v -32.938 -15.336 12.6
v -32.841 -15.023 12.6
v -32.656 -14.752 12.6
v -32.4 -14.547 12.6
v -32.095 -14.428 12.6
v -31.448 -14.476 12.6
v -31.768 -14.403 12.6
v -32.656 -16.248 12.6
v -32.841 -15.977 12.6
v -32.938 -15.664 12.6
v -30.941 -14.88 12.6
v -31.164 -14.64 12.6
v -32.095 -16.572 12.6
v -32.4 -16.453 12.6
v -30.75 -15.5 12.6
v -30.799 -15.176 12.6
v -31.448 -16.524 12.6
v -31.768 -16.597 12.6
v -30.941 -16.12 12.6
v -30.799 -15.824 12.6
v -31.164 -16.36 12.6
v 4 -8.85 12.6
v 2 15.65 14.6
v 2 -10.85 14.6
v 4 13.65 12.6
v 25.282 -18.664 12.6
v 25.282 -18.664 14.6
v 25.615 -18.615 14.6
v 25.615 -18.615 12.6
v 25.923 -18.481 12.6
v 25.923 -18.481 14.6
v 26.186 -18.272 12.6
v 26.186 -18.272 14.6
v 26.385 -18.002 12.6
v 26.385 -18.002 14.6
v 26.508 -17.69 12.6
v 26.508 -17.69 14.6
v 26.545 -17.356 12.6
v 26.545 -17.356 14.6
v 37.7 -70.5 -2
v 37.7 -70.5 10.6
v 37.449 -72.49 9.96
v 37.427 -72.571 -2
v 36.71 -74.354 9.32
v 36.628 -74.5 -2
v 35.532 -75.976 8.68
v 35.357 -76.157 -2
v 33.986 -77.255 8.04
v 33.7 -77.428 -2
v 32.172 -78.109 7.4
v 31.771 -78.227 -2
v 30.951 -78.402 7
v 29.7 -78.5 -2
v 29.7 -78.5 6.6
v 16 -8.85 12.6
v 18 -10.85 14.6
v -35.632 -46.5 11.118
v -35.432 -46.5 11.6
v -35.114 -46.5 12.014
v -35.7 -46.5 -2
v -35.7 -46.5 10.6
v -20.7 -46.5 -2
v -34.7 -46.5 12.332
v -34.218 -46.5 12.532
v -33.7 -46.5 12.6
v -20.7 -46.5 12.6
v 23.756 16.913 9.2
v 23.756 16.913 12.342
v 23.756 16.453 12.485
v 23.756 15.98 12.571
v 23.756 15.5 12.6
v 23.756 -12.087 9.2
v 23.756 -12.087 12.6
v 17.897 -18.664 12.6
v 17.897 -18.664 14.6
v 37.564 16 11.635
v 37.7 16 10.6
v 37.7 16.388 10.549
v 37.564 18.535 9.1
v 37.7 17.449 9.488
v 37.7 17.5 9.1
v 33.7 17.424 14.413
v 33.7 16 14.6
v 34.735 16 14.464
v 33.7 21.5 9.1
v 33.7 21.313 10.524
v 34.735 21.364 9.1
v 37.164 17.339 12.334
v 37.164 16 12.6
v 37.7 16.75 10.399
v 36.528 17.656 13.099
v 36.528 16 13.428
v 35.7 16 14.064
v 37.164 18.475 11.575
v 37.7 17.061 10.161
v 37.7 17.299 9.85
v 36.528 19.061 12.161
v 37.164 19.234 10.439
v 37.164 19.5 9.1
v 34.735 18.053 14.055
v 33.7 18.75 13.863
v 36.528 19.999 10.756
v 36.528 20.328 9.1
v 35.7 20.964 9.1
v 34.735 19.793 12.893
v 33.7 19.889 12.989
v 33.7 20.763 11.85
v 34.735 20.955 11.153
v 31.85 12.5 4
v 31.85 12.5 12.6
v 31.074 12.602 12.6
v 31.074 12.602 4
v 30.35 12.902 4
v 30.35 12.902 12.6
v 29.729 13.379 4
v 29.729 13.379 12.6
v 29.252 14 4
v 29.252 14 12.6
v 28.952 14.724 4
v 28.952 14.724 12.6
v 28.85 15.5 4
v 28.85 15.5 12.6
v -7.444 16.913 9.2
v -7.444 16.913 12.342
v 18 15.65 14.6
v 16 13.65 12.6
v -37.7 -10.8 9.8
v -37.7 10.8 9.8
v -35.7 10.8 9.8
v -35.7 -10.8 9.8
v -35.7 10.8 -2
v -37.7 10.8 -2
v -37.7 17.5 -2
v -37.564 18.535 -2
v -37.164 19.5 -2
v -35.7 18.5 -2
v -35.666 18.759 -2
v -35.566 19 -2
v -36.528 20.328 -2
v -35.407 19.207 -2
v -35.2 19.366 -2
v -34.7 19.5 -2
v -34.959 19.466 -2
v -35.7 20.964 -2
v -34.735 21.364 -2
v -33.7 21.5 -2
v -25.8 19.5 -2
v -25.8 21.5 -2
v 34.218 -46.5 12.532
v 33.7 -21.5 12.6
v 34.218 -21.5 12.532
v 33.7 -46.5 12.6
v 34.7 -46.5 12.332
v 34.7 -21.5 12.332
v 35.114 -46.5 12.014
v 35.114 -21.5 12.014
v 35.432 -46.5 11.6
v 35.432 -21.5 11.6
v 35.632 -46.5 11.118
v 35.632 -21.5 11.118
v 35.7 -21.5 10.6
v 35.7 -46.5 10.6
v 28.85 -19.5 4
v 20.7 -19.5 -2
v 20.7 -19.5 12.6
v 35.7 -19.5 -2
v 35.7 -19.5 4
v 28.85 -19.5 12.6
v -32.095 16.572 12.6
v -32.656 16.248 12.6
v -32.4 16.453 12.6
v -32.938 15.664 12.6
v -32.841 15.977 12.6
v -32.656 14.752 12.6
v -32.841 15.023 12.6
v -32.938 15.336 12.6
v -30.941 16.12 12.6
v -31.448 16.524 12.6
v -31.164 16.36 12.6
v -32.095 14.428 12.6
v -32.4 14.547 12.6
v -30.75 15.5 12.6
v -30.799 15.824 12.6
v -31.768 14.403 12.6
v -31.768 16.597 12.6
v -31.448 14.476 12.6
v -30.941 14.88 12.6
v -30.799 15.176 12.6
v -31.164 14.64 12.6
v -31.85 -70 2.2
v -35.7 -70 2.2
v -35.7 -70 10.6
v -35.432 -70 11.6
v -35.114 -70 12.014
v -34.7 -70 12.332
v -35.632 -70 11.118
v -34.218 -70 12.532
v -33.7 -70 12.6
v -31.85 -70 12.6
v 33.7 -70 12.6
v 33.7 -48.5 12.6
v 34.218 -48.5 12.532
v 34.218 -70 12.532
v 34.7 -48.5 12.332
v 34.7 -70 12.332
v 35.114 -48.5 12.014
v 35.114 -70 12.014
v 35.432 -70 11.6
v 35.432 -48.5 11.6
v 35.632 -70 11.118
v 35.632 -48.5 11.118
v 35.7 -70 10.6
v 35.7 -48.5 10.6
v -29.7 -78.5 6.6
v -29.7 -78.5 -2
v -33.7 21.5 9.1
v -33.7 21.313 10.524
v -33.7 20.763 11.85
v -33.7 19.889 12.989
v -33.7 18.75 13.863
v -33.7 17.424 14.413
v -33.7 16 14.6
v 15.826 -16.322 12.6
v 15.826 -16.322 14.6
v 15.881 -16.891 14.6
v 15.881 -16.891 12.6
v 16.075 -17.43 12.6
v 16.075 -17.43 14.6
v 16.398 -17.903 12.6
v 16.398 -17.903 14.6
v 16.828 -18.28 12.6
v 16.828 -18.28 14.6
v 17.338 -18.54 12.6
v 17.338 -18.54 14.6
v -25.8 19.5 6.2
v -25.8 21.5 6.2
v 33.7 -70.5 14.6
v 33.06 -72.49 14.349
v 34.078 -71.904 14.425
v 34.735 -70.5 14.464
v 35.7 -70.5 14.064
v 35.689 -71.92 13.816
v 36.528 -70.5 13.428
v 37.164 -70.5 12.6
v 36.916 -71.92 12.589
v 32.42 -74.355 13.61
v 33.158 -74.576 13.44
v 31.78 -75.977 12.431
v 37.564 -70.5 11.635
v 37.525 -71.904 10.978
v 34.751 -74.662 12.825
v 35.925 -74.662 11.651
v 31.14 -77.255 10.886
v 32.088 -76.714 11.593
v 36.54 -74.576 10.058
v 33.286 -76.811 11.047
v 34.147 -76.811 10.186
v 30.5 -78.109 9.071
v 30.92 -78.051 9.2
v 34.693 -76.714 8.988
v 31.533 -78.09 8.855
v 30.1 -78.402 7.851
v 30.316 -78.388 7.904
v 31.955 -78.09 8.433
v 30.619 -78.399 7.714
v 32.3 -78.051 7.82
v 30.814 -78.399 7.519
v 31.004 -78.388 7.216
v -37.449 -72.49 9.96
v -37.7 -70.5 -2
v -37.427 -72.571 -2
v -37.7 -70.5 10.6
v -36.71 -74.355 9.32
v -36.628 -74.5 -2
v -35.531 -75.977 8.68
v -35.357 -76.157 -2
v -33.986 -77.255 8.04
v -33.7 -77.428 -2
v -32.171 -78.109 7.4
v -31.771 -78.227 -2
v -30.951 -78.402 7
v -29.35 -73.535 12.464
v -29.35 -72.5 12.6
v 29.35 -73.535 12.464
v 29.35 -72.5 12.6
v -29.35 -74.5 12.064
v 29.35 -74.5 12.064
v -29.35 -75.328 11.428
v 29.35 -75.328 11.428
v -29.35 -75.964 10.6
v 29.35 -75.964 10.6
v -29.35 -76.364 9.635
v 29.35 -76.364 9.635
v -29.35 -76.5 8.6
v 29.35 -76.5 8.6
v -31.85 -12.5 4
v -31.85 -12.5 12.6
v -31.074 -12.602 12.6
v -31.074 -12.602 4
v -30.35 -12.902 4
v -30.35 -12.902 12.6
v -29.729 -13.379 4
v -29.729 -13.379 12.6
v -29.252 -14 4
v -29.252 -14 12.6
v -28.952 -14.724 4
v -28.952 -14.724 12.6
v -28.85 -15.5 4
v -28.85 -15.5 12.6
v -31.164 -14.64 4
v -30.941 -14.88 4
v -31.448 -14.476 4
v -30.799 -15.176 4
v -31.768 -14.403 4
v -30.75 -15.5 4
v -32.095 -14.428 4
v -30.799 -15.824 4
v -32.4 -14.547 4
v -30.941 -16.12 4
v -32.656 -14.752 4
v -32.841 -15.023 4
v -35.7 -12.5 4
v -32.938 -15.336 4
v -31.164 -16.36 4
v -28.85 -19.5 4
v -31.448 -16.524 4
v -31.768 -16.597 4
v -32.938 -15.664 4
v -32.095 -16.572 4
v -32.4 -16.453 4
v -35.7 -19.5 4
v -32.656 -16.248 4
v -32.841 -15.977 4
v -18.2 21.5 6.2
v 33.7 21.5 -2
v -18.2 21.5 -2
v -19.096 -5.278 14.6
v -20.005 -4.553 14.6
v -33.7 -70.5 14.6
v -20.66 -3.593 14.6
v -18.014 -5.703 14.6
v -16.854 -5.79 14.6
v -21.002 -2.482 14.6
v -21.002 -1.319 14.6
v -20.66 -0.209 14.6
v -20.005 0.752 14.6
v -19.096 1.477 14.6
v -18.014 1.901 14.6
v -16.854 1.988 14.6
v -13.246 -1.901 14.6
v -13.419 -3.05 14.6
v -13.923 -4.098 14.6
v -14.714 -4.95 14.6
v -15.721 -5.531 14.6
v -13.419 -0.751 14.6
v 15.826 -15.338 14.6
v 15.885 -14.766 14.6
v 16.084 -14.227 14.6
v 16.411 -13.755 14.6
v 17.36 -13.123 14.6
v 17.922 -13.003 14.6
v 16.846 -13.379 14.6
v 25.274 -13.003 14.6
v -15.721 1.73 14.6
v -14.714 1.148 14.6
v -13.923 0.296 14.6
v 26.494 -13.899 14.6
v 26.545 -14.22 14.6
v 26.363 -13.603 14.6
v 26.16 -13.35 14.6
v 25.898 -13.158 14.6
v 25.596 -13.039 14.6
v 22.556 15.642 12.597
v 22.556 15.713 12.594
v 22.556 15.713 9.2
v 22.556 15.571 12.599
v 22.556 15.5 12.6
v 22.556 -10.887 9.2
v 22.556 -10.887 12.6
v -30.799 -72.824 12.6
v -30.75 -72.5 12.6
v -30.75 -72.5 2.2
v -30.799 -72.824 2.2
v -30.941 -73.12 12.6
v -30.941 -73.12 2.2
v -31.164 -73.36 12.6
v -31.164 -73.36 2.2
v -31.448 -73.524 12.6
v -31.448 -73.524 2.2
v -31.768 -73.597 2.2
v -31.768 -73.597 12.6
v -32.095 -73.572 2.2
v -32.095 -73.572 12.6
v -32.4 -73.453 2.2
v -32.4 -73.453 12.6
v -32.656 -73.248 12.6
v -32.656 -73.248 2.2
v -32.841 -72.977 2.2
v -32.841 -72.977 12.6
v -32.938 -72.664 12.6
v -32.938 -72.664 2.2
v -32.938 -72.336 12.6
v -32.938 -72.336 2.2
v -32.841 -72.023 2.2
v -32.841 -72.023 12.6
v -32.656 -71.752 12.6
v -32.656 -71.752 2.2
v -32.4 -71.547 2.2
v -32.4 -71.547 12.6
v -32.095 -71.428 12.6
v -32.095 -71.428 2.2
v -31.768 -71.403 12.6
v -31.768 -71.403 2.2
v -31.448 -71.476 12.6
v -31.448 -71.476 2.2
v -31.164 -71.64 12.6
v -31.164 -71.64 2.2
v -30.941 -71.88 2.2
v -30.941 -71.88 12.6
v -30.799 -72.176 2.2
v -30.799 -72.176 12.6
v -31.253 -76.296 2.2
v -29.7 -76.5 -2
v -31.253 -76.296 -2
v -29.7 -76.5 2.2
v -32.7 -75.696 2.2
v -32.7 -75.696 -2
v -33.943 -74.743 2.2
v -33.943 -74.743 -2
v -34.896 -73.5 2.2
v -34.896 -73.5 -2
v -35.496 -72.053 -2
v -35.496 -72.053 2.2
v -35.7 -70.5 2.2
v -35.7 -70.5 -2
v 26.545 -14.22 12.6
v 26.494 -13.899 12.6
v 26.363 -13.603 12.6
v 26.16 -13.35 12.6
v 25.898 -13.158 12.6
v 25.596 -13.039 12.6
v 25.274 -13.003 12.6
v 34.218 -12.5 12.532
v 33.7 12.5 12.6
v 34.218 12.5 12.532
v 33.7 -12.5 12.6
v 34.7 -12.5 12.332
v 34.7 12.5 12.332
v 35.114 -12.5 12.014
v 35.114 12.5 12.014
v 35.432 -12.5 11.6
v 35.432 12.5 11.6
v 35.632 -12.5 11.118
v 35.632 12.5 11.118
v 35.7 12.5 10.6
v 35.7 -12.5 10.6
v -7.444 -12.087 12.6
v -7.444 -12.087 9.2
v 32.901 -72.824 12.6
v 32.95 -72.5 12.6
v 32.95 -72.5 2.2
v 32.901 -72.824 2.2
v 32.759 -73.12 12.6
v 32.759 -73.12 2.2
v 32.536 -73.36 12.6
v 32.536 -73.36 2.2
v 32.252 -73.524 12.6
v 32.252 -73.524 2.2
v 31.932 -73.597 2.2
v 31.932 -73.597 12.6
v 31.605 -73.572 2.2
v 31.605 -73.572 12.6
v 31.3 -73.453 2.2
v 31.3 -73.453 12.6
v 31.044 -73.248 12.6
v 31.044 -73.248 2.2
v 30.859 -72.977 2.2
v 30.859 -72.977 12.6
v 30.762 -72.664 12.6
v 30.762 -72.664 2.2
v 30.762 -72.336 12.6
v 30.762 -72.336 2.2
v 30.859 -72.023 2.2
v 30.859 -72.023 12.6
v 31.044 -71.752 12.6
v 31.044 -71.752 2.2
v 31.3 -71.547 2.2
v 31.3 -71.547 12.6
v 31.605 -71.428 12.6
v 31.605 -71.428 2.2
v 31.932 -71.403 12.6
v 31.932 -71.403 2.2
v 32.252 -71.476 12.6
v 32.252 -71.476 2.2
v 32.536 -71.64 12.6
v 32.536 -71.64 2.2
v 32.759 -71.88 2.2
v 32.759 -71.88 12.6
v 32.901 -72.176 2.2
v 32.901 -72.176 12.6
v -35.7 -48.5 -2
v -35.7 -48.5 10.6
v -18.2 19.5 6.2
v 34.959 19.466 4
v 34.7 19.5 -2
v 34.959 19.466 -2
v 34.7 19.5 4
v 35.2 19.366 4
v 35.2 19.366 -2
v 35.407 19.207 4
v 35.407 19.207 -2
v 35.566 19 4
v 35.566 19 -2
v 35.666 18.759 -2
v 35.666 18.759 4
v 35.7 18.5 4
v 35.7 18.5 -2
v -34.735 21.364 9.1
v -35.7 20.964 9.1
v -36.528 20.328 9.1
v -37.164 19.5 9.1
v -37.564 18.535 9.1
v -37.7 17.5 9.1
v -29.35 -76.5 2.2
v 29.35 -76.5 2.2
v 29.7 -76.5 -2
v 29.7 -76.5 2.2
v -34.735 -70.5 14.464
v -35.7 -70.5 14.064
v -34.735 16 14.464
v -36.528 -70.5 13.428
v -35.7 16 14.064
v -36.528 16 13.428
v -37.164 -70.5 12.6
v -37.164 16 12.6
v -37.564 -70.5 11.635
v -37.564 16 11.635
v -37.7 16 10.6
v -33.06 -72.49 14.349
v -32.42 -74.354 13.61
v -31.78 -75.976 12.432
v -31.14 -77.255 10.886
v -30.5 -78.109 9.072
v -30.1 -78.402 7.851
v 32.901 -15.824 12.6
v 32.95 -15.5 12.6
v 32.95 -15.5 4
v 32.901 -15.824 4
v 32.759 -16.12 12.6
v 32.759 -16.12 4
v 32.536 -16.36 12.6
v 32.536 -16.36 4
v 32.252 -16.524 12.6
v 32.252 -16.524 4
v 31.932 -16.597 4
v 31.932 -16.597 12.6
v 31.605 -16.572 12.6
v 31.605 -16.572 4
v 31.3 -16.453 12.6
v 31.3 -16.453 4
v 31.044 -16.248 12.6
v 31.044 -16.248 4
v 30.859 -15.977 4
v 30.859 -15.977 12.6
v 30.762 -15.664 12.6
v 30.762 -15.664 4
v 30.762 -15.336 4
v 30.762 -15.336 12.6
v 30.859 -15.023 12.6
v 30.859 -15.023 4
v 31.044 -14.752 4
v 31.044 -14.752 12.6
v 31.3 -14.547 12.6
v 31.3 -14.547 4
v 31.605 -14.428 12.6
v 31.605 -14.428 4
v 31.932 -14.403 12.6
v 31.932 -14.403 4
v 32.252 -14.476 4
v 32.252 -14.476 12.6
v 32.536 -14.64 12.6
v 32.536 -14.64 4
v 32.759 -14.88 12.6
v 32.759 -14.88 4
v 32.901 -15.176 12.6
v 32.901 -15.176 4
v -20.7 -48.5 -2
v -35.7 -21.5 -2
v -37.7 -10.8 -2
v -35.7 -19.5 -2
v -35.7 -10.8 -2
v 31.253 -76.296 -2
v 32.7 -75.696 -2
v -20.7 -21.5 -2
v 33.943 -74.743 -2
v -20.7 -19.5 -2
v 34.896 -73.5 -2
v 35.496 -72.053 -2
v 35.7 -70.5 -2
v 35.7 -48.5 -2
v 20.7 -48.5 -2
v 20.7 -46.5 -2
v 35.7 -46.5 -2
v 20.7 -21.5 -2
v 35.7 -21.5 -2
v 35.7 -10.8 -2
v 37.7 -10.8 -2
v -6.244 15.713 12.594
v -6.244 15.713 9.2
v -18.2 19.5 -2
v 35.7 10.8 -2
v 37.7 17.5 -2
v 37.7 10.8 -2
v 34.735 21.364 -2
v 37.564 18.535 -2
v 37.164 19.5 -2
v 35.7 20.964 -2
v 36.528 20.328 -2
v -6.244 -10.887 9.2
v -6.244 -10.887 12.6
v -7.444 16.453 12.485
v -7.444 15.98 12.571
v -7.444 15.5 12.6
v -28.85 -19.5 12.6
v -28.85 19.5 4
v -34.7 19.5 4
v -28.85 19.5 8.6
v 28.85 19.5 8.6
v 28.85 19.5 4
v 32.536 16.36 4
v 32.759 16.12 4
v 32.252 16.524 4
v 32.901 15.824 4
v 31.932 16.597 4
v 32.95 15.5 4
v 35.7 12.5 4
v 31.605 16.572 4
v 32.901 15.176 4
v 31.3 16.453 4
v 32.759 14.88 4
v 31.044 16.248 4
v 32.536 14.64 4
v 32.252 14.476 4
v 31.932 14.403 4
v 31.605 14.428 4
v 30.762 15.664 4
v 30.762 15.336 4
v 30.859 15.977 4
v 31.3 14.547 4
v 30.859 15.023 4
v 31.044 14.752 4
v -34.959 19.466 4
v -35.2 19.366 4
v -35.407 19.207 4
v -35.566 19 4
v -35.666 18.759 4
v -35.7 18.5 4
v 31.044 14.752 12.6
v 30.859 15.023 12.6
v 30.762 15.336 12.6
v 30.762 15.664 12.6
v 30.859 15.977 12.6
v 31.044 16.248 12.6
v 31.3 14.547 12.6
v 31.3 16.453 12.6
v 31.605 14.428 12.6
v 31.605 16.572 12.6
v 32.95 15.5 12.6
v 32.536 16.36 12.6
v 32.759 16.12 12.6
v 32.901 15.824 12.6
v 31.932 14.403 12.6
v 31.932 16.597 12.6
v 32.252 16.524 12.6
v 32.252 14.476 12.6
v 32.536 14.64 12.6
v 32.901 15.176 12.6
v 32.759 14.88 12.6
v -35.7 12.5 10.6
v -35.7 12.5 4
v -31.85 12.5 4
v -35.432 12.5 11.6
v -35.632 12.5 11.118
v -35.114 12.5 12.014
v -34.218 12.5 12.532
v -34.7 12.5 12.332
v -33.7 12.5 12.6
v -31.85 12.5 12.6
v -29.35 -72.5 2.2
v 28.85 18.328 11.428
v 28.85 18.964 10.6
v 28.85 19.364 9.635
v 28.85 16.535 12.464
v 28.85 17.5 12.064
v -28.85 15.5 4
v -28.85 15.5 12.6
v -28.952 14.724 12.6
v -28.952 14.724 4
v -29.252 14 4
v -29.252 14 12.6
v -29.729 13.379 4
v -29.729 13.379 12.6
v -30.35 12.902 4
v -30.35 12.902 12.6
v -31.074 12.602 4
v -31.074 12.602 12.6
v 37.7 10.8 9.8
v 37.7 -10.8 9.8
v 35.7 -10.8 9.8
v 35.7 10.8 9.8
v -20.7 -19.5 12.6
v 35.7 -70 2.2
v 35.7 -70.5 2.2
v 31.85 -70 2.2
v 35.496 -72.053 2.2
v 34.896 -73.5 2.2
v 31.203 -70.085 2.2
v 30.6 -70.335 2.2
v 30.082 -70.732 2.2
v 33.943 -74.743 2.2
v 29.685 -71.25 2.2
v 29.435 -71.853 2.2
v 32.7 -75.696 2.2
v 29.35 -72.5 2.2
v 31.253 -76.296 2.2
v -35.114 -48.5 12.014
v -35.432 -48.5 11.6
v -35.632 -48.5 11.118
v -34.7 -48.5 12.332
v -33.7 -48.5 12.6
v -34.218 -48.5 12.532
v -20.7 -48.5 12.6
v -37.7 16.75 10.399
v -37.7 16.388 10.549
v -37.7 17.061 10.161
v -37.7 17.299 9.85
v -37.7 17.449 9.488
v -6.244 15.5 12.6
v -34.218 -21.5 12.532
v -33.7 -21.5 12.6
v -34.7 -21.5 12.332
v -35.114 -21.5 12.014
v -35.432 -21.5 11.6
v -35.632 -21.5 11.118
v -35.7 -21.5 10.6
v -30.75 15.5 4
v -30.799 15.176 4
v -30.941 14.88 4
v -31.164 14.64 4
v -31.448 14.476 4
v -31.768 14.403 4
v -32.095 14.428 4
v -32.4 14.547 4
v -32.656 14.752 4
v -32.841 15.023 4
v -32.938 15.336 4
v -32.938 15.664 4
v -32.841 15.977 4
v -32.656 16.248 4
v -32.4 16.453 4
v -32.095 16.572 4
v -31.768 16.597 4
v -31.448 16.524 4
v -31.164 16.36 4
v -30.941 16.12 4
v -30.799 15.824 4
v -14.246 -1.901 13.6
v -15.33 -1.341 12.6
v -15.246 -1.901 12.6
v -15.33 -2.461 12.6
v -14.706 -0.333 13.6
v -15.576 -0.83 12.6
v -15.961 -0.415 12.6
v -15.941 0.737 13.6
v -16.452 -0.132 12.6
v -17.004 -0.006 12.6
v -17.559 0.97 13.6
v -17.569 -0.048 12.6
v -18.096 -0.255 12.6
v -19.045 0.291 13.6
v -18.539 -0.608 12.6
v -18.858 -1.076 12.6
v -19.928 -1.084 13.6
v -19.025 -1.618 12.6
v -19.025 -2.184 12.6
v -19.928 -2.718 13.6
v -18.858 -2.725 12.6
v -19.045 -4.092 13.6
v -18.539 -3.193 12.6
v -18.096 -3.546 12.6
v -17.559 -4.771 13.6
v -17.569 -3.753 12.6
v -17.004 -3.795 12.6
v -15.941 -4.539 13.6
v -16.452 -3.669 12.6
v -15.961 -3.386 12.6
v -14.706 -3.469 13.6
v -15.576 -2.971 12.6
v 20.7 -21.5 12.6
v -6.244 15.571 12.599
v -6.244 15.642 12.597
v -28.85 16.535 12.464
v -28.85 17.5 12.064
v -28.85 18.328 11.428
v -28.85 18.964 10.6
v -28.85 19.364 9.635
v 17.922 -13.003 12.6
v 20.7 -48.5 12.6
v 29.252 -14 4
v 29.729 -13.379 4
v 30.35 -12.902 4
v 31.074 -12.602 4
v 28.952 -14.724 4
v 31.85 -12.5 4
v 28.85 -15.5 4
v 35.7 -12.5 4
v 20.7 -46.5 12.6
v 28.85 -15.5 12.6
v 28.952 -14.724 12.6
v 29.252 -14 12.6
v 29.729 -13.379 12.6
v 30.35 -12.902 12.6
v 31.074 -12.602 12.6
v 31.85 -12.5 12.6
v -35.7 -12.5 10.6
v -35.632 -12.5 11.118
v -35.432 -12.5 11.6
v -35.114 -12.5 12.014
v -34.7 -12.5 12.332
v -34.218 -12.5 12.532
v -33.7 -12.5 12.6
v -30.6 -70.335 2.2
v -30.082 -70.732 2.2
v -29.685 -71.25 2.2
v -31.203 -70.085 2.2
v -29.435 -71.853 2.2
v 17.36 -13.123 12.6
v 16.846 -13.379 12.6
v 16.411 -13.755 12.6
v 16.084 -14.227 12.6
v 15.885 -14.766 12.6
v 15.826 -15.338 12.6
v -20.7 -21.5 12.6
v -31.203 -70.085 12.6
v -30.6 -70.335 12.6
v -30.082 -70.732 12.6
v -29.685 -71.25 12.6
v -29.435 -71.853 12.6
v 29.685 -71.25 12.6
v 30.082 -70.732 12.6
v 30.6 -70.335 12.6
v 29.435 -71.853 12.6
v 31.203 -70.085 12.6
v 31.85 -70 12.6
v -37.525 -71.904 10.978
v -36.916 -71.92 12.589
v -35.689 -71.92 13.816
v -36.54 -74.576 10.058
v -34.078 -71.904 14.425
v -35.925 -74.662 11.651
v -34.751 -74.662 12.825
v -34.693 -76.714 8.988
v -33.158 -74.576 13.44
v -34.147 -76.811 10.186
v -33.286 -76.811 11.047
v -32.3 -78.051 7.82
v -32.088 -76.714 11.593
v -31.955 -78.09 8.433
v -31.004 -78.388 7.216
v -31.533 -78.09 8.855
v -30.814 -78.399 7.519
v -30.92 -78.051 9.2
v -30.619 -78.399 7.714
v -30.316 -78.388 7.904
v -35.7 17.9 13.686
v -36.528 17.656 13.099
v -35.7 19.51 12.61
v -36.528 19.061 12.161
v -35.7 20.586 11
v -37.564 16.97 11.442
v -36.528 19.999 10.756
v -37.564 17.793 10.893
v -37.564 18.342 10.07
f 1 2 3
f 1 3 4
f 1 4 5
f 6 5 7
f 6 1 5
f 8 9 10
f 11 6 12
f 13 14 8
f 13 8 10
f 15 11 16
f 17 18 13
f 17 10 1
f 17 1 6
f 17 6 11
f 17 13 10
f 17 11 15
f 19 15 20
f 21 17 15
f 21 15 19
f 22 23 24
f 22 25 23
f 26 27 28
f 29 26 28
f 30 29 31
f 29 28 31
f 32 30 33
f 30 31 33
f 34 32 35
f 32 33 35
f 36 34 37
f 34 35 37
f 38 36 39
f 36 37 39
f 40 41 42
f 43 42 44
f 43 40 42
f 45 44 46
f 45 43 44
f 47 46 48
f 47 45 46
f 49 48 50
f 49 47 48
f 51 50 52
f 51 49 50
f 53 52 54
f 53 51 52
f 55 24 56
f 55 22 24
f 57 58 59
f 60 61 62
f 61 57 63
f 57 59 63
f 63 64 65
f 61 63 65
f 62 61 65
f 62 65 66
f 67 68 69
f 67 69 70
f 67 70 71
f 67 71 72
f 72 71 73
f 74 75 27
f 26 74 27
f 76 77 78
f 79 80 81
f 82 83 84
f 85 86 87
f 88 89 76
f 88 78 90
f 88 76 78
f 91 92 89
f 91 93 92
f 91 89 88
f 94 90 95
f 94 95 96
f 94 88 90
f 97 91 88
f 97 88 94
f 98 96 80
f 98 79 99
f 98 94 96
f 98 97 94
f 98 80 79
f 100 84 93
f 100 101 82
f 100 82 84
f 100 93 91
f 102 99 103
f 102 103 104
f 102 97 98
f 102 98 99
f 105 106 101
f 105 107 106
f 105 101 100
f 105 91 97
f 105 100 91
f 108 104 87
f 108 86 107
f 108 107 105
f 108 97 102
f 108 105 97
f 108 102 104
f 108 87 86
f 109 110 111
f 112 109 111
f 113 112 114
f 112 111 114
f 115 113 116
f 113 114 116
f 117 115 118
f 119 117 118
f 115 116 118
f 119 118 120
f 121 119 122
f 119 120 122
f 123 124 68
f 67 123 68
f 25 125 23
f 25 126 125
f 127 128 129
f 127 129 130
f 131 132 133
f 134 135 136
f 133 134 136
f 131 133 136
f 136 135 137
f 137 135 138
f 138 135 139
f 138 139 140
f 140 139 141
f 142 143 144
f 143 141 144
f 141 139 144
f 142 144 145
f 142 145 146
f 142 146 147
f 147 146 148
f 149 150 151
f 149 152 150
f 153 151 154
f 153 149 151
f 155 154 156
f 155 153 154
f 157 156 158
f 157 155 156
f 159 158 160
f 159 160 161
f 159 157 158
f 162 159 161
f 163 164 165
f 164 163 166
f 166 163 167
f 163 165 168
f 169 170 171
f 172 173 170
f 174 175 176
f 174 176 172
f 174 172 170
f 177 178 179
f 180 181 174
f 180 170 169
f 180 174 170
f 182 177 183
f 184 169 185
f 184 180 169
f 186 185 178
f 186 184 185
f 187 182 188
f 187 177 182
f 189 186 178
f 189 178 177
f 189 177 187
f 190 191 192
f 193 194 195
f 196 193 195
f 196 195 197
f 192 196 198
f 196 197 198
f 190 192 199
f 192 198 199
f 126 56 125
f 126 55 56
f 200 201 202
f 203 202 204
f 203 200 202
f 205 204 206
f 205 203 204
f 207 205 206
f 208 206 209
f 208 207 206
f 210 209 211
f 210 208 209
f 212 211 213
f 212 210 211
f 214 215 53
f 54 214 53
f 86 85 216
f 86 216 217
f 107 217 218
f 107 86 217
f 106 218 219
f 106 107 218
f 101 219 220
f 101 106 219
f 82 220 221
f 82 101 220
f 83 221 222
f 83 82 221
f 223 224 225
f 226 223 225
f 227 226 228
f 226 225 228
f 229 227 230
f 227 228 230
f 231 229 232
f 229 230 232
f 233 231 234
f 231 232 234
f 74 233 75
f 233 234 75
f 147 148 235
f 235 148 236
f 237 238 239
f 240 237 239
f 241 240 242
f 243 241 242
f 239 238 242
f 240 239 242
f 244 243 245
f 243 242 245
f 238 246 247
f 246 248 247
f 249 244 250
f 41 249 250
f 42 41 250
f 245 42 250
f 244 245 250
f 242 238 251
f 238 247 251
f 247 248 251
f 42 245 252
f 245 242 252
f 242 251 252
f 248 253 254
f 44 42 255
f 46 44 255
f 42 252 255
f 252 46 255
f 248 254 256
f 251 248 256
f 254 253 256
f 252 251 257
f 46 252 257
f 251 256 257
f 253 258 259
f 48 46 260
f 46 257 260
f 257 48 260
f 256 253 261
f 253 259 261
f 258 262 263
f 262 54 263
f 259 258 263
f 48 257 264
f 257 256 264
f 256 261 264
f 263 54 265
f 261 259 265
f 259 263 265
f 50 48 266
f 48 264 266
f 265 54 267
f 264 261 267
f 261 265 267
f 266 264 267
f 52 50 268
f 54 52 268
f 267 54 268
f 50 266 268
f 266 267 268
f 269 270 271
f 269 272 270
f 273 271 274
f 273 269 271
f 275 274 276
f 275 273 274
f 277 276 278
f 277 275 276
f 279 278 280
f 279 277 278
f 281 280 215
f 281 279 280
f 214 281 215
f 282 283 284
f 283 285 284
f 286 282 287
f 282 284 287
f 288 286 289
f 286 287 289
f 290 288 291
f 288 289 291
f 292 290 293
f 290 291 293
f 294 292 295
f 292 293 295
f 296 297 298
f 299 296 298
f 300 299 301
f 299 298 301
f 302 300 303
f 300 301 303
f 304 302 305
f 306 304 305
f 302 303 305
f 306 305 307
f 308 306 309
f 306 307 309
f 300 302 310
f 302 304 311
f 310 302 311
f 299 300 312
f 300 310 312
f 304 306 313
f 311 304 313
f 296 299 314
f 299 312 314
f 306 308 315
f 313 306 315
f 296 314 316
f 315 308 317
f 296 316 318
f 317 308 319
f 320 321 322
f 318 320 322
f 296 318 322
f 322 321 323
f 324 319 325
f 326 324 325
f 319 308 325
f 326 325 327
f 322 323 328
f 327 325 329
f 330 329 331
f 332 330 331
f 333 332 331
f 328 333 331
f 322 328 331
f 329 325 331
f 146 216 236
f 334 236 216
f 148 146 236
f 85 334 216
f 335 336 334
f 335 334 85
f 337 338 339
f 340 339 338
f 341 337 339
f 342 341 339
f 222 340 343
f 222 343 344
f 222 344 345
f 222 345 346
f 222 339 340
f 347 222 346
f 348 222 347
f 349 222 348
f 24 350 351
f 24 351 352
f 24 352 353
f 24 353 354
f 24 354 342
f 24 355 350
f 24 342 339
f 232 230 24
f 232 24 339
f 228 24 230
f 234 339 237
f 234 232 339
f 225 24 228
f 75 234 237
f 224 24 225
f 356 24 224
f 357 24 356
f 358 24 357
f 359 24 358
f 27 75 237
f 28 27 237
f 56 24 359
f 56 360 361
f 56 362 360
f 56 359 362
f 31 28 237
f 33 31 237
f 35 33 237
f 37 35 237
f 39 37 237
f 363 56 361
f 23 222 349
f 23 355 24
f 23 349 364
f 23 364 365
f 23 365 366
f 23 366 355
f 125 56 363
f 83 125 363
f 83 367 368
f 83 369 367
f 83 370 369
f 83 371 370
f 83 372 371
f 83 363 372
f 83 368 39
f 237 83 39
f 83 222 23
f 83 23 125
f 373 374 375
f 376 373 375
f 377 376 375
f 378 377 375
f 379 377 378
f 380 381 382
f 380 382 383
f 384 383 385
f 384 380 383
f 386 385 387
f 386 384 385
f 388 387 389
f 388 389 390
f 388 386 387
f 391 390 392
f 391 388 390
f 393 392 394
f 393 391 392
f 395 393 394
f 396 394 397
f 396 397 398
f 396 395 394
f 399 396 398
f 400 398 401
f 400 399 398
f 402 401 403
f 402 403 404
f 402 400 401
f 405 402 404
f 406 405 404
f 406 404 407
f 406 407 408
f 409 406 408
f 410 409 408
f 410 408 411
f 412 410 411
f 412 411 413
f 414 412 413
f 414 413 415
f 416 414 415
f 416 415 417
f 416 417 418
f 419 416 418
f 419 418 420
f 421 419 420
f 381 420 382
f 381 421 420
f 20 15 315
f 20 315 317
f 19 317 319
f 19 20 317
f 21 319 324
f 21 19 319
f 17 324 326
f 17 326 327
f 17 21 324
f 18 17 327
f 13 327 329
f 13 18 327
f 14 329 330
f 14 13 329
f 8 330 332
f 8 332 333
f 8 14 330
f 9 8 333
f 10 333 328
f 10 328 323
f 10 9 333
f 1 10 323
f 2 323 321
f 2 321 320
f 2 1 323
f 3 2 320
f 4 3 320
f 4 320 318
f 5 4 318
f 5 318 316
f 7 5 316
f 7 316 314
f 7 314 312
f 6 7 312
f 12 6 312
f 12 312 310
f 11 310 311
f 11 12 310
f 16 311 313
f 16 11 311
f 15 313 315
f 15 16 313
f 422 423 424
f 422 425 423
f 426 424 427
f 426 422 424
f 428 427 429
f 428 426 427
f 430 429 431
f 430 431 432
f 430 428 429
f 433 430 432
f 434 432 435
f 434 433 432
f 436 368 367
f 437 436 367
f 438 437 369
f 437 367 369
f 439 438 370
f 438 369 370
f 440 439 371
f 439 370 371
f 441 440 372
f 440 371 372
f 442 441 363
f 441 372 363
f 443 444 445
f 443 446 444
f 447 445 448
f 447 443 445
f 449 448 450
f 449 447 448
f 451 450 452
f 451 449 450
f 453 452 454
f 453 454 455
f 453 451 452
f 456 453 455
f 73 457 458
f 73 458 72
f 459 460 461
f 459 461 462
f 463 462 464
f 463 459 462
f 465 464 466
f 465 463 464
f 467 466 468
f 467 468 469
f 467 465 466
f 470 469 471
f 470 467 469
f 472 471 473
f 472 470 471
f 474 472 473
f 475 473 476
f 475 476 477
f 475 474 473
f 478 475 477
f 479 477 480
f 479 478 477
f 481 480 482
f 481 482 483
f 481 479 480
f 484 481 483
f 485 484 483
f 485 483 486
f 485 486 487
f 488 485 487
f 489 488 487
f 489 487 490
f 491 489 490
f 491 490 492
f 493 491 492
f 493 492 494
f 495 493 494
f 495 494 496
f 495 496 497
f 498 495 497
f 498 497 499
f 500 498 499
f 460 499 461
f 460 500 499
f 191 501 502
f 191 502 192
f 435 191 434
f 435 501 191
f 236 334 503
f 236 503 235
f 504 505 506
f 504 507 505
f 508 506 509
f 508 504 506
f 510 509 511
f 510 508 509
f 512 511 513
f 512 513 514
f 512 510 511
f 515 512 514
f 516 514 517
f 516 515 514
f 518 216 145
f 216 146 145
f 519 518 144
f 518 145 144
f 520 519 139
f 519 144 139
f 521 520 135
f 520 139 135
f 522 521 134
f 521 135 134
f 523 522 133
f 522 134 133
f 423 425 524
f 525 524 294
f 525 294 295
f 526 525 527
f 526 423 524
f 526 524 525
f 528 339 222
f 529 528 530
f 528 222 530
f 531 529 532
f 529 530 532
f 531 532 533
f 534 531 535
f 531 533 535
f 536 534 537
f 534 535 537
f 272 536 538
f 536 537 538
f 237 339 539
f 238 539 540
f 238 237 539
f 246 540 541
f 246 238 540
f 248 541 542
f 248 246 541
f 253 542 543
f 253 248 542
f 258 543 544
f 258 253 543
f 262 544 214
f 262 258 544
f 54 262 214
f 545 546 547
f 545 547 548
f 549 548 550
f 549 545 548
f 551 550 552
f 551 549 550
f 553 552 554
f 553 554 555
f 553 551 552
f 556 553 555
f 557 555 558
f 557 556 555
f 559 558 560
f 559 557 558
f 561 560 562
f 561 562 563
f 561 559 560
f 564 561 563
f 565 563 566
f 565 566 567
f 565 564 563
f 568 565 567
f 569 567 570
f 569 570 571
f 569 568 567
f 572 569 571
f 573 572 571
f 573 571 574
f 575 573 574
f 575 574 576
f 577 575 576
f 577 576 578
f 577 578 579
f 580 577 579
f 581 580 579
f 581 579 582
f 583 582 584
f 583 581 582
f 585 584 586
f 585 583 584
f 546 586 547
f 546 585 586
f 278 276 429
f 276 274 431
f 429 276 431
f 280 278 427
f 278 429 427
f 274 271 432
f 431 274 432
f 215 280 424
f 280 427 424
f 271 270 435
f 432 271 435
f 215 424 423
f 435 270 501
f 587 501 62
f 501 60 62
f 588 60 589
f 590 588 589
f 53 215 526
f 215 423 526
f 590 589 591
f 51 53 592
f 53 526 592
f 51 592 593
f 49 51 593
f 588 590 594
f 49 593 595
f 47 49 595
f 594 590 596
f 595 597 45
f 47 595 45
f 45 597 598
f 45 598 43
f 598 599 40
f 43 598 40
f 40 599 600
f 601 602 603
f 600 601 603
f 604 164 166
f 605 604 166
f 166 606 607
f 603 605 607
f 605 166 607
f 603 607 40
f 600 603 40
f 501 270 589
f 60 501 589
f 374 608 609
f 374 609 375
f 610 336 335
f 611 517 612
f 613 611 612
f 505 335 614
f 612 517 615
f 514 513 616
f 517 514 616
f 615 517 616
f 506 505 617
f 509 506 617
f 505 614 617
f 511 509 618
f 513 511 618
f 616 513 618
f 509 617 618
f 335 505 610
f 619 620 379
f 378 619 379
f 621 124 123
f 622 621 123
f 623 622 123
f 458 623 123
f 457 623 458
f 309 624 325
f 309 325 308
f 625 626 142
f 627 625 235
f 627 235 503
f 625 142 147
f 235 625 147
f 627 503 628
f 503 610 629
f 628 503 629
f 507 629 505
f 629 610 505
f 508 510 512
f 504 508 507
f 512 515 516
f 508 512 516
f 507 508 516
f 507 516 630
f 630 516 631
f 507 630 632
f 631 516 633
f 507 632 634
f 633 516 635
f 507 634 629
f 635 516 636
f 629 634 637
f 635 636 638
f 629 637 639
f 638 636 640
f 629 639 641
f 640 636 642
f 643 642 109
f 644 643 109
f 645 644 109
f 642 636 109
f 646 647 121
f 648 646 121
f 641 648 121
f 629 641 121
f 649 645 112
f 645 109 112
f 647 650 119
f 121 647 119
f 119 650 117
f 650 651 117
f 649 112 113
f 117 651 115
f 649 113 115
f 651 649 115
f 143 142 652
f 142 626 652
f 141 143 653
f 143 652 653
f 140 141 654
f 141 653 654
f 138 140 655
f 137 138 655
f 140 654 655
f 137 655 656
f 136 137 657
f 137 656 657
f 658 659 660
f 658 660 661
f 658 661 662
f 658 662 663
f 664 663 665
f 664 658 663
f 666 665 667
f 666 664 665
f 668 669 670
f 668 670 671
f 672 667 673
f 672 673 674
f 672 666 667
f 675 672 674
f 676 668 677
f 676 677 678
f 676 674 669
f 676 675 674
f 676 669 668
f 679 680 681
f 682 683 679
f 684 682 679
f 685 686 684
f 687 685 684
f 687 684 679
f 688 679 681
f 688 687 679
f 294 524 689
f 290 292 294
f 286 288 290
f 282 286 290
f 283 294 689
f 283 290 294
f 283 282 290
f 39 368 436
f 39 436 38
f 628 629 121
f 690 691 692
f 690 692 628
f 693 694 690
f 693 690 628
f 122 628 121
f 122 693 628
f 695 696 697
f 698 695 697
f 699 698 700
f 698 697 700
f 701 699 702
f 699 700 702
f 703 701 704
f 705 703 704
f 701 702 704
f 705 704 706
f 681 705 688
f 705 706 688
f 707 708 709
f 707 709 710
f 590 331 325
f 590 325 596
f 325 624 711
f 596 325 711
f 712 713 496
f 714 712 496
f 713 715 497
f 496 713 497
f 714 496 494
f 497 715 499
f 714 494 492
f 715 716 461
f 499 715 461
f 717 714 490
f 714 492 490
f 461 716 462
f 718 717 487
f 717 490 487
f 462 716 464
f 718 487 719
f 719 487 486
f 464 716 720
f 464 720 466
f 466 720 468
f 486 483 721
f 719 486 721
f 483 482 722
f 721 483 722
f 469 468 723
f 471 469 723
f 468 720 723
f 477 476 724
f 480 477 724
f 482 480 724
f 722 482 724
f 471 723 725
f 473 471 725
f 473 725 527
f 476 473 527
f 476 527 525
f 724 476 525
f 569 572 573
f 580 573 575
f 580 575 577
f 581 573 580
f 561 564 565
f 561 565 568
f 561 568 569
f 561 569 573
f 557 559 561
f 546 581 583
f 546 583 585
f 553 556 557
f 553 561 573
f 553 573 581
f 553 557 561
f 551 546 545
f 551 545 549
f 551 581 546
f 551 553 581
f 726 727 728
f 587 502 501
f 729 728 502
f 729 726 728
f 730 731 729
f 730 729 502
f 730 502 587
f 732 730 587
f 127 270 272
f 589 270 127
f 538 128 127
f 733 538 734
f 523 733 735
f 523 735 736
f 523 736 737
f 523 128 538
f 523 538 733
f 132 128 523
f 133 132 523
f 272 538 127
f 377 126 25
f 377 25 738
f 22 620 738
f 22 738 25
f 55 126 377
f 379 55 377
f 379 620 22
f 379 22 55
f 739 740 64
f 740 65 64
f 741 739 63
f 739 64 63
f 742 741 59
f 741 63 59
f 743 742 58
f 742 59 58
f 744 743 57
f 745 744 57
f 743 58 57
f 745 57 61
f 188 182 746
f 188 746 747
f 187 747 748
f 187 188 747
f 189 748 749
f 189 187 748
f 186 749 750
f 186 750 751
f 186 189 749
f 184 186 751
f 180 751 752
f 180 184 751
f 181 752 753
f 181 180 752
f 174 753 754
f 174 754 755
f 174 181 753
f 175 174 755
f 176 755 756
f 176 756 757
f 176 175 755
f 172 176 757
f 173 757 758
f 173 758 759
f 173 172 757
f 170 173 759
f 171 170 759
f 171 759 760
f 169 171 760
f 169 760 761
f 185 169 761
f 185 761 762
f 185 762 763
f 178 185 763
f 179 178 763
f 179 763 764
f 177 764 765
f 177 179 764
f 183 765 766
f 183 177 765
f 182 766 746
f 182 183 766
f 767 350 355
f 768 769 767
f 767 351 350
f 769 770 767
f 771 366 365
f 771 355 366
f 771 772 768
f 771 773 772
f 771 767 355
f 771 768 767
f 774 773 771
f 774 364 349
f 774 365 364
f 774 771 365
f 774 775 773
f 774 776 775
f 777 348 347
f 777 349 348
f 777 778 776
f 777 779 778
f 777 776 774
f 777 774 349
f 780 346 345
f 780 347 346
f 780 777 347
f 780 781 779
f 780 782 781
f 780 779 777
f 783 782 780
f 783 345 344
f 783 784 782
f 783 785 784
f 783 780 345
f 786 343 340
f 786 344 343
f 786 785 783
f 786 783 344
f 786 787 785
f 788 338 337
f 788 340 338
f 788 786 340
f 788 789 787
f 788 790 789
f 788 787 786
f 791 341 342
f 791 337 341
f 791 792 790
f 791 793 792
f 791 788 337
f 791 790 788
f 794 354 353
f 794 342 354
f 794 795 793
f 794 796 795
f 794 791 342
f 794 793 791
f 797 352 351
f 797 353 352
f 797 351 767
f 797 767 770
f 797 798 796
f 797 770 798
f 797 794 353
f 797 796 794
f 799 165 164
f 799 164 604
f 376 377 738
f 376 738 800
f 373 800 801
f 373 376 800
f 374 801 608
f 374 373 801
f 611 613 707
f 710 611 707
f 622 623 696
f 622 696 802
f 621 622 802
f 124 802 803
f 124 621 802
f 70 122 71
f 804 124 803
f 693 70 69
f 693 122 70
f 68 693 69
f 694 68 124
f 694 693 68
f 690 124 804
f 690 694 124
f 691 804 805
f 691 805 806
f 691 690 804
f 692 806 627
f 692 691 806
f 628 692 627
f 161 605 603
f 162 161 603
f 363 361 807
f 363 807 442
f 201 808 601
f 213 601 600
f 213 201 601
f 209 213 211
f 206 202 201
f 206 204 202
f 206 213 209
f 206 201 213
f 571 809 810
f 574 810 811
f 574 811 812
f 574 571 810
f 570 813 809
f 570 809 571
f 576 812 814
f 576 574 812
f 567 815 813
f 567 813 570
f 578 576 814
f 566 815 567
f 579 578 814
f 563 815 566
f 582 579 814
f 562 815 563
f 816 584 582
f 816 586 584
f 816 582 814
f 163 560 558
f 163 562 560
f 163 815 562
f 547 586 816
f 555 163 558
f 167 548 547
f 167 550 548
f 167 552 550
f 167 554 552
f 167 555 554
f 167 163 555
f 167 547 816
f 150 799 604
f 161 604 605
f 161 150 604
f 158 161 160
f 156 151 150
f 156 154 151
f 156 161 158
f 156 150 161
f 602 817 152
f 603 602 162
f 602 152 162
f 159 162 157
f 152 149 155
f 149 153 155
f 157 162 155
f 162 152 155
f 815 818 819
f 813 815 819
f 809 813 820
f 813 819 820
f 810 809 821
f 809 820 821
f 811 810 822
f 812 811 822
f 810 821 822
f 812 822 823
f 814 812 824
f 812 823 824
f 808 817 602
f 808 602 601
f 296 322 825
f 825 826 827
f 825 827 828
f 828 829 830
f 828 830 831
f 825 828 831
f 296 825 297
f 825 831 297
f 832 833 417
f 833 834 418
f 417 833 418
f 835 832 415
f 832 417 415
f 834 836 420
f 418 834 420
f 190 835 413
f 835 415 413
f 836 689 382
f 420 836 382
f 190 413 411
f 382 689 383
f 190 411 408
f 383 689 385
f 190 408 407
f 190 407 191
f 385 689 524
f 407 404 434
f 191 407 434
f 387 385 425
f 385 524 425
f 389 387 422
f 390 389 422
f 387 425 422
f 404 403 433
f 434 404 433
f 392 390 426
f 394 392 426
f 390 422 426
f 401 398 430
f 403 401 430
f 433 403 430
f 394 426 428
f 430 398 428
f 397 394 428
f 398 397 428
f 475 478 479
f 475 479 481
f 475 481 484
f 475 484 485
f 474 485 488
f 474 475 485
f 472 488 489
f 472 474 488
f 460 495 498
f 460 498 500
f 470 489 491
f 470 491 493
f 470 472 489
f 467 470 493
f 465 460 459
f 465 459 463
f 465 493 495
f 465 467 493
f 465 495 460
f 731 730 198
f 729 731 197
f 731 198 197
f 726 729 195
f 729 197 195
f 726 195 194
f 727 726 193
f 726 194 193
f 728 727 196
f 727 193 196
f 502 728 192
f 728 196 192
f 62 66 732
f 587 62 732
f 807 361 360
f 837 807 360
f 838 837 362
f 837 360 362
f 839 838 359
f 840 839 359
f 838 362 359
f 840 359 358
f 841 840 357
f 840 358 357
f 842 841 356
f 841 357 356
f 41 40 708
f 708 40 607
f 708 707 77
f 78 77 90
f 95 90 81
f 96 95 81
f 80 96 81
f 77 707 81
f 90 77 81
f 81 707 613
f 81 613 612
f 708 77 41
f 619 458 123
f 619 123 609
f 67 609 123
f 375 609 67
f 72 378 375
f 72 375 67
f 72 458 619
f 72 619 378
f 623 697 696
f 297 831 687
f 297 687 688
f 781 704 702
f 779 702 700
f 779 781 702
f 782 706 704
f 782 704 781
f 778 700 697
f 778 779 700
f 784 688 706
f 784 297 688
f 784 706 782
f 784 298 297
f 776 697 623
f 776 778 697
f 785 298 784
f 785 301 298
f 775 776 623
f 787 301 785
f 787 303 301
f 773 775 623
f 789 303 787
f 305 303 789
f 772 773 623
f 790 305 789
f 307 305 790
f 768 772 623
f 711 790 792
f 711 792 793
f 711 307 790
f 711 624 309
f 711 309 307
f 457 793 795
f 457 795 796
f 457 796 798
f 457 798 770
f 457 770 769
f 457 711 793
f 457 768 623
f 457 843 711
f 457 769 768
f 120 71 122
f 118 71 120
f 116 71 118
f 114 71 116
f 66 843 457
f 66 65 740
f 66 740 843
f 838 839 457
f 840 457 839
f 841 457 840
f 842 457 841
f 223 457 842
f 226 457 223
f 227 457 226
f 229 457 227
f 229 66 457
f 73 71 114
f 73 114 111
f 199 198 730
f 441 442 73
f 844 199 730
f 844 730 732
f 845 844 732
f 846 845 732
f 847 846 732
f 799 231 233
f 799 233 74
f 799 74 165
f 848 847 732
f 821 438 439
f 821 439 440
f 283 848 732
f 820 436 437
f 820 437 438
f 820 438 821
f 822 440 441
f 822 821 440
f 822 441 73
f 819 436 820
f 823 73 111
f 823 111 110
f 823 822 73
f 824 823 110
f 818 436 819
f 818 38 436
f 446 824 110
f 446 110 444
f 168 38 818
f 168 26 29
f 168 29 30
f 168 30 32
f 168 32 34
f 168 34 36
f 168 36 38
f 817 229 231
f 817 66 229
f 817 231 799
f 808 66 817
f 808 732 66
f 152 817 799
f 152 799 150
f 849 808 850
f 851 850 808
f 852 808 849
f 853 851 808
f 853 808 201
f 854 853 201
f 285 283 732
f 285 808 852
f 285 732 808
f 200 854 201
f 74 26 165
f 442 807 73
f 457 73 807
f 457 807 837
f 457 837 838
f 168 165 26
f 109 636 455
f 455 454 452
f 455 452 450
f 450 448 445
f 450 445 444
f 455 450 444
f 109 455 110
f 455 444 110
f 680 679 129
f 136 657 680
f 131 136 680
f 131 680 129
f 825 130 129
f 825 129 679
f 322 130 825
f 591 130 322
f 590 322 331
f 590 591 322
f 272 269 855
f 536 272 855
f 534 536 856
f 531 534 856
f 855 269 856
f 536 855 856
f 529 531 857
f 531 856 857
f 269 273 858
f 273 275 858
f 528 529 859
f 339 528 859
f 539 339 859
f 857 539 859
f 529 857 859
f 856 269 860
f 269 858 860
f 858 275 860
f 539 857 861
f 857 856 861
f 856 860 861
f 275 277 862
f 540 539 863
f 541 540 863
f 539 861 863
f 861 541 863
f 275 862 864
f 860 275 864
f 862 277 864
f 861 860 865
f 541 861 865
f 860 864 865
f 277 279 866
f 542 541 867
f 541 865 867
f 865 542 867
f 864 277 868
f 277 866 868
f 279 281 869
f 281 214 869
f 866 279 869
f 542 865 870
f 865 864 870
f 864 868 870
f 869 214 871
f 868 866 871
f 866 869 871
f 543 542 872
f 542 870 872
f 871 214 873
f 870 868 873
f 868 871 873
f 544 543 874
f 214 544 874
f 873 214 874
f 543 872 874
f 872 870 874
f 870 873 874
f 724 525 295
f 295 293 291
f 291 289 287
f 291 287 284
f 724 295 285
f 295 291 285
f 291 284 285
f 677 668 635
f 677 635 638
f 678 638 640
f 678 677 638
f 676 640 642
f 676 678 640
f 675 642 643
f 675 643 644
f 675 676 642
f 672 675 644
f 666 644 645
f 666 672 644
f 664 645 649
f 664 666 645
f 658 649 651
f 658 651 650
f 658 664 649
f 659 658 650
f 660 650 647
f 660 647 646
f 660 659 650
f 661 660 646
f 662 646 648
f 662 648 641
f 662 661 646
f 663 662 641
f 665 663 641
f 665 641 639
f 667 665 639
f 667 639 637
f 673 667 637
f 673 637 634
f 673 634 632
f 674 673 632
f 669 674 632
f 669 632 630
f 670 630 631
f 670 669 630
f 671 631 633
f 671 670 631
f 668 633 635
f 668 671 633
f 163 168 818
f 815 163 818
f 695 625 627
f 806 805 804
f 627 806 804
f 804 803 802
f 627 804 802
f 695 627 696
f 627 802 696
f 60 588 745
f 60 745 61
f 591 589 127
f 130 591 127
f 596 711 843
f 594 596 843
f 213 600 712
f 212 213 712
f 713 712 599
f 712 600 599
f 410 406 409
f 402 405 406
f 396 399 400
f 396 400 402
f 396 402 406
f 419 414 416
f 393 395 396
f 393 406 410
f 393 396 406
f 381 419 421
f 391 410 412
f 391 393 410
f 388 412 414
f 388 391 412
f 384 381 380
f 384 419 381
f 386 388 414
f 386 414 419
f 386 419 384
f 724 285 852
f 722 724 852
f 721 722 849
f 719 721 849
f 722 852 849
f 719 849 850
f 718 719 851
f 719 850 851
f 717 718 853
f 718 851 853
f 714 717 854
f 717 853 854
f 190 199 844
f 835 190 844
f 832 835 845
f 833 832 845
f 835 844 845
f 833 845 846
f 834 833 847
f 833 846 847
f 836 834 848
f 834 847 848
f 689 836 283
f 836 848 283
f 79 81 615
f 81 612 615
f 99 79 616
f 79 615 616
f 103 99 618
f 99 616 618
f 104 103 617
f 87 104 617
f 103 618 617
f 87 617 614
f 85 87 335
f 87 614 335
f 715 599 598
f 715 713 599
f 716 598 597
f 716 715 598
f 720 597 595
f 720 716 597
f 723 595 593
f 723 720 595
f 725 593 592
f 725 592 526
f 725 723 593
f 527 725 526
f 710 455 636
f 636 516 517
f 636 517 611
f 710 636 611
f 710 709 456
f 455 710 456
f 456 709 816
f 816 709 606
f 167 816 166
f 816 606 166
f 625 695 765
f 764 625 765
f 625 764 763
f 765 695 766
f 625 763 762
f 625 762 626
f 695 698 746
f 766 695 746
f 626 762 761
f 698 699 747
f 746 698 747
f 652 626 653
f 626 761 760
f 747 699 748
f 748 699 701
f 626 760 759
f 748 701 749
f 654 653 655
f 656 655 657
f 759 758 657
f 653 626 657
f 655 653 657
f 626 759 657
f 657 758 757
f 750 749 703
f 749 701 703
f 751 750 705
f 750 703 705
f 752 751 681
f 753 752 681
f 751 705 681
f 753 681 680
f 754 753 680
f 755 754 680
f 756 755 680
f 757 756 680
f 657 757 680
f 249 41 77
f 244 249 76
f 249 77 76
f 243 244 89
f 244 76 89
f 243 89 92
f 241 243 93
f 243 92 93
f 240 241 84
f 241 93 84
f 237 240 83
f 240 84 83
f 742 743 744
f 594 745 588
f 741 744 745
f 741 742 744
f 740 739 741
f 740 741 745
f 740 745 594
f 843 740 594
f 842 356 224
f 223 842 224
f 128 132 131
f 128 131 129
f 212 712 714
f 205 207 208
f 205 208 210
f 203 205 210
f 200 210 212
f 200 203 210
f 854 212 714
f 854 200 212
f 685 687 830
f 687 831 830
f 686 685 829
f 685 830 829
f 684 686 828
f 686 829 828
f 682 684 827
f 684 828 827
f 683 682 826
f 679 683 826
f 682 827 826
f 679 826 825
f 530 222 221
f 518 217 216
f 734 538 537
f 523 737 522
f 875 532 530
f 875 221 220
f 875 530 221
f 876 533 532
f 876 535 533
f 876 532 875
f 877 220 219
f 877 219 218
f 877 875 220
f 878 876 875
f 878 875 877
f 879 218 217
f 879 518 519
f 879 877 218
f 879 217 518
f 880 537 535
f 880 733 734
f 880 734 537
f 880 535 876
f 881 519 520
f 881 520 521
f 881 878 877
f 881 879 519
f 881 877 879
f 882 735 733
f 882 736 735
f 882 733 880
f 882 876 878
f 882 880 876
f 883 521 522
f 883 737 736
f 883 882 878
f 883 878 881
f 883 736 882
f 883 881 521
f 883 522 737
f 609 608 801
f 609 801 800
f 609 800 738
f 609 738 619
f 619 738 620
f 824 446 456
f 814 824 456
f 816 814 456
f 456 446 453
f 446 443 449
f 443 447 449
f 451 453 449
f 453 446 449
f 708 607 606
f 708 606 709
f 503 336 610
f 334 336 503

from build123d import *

# Parameters (mm, degrees)
SKETCH_W        = 75.4
SKETCH_H        = 100
PAD_DEPTH       = 16.6
SKETCH005_W     = 71.4
SKETCH005_H     = 96
POCKET_DEPTH    = 14.6
SKETCH006_W     = 21.6
SKETCH006_H     = 11.8
POCKET001_DEPTH = 2
SKETCH007_W     = 21.6
SKETCH007_H     = 11.8
POCKET002_DEPTH = 2
SKETCH008_W     = 7.6
SKETCH008_H     = 8.2
POCKET003_DEPTH = 2
POCKET004_DEPTH = 2
SKETCH010_R     = 3.9
SKETCH010_W     = 16
SKETCH010_H     = 26.5
POCKET005_DEPTH = 2
POCKET005_TAPER = 45
SKETCH011_W     = 15
SKETCH011_H     = 2
PAD005_DEPTH    = 14.6
SKETCH012_R     = 1.1
PAD006_DEPTH    = 8.6
SKETCH013_R     = 1.1
PAD007_DEPTH    = 10.4
FILLET_R        = 2
FILLET001_R     = 4
FILLET002_R     = 1
FILLET003_R     = 6
FILLET004_R     = 5.5
FILLET005_R     = 4
SKETCH022_W     = 31.2
SKETCH022_H     = 29
SKETCH022_W_2   = 28.8
SKETCH022_H_2   = 26.6
PAD013_DEPTH    = 3.4
FILLET011_R     = 8


with BuildPart() as part:
    # Sketch → Pad (new body)
    with BuildSketch(Plane.XY):
        with Locations((0, -28.5)):
            Rectangle(SKETCH_W, SKETCH_H)
    extrude(amount=PAD_DEPTH)

    # Sketch005 (on Face5 of Pad) → Pocket (cut)
    with BuildSketch(Plane(origin=(0, 0, 0), x_dir=(1, 0, 0), z_dir=(0, 0, -1))):
        with Locations((0, 28.5)):
            Rectangle(SKETCH005_W, SKETCH005_H)
    extrude(amount=-POCKET_DEPTH, mode=Mode.SUBTRACT)

    # Sketch006 (on Face3 of Pocket) → Pocket001 (cut)
    with BuildSketch(Plane.YZ.offset(37.7)):
        with Locations((0, 5.9)):
            Rectangle(SKETCH006_W, SKETCH006_H)
    extrude(amount=-POCKET001_DEPTH, mode=Mode.SUBTRACT)

    # Sketch007 (on Face2 of Pocket) → Pocket002 (cut)
    with BuildSketch(Plane(origin=(-37.7, 0, 0), x_dir=(0, -1, 0), z_dir=(-1, 0, 0))):
        with Locations((0, 5.9)):
            Rectangle(SKETCH007_W, SKETCH007_H)
    extrude(amount=-POCKET002_DEPTH, mode=Mode.SUBTRACT)

    # Sketch008 (on Face1 of Pocket) → Pocket003 (cut)
    with BuildSketch(Plane(origin=(0, 21.5, 0), x_dir=(-1, 0, 0), z_dir=(0, 1, 0))):
        with Locations((22, 4.1)):
            Rectangle(SKETCH008_W, SKETCH008_H)
    extrude(amount=-POCKET003_DEPTH, mode=Mode.SUBTRACT)

    # Sketch009 (on Face5 of Pocket) → Pocket004 (cut)
    with BuildSketch(Plane.XY.offset(16.6)):
        with BuildLine():
            Line((15.825713, -15.337742), (15.825713, -16.321696))
            ThreePointArc((15.825713, -16.321696), (16.397859, -17.902616), (17.897046, -18.663599))
            Line((17.897046, -18.663599), (25.282393, -18.663599))
            ThreePointArc((25.282393, -18.663599), (26.185781, -18.272491), (26.544973, -17.355945))
            Line((26.544973, -14.219638), (26.544973, -17.355945))
            ThreePointArc((26.544973, -14.219638), (26.159832, -13.349897), (25.274241, -13.00275))
            Line((17.921865, -13.00275), (25.274241, -13.00275))
            ThreePointArc((17.921865, -13.00275), (16.411472, -13.755218), (15.825713, -15.337742))
        make_face()
    extrude(amount=-POCKET004_DEPTH, mode=Mode.SUBTRACT)

    # Sketch010 (on Face5 of Pocket) → Pocket005 (cut)
    with BuildSketch(Plane.XY.offset(16.6)):
        with Locations((-17.145816, -1.900756)):
            Circle(SKETCH010_R)
        with Locations((10, 2.4)):
            Rectangle(SKETCH010_W, SKETCH010_H)
    extrude(amount=-POCKET005_DEPTH, taper=POCKET005_TAPER, mode=Mode.SUBTRACT)

    # Sketch011 (on Face11 of Pocket) → Pad005 (join)
    with BuildSketch(Plane(origin=(0, 0, 14.6), x_dir=(1, 0, 0), z_dir=(0, 0, -1))):
        with Locations((-28.2, 47.5)):
            Rectangle(SKETCH011_W, SKETCH011_H)
        with Locations((-28.2, 20.5)):
            Rectangle(SKETCH011_W, SKETCH011_H)
        with Locations((28.2, 47.5)):
            Rectangle(SKETCH011_W, SKETCH011_H)
        with Locations((28.2, 20.5)):
            Rectangle(SKETCH011_W, SKETCH011_H)
    extrude(amount=PAD005_DEPTH)

    # Sketch012 (on Face11 of Pocket) → Pad006 (join)
    with BuildSketch(Plane(origin=(0, 0, 14.6), x_dir=(1, 0, 0), z_dir=(0, 0, -1))):
        with BuildLine():
            Line((-35.7, -12.5), (-31.85, -12.5))
            ThreePointArc((-28.85, -15.5), (-29.72868, -13.37868), (-31.85, -12.5))
            Line((-28.85, -19.5), (-28.85, -15.5))
            Line((-28.85, -19.5), (-35.7, -19.5))
            Line((-35.7, -12.5), (-35.7, -19.5))
        make_face()
        with Locations((-31.85, -15.5)):
            Circle(SKETCH012_R, mode=Mode.SUBTRACT)
        with BuildLine():
            Line((28.85, -19.5), (28.85, -15.5))
            ThreePointArc((31.85, -12.5), (29.72868, -13.37868), (28.85, -15.5))
            Line((35.7, -12.5), (31.85, -12.5))
            Line((35.7, -12.5), (35.7, -19.5))
            Line((28.85, -19.5), (35.7, -19.5))
        make_face()
        with Locations((31.85, -15.5)):
            Circle(SKETCH012_R, mode=Mode.SUBTRACT)
        with BuildLine():
            Line((-35.7, 12.5), (-35.7, 19.5))
            Line((-35.7, 19.5), (-28.85, 19.5))
            Line((-28.85, 19.5), (-28.85, 15.5))
            ThreePointArc((-31.85, 12.5), (-29.72868, 13.37868), (-28.85, 15.5))
            Line((-35.7, 12.5), (-31.85, 12.5))
        make_face()
        with Locations((-31.85, 15.5)):
            Circle(SKETCH012_R, mode=Mode.SUBTRACT)
        with BuildLine():
            Line((31.85, 12.5), (35.7, 12.5))
            Line((35.7, 12.5), (35.7, 19.5))
            Line((35.7, 19.5), (28.85, 19.5))
            Line((28.85, 19.5), (28.85, 15.5))
            ThreePointArc((28.85, 15.5), (29.72868, 13.37868), (31.85, 12.5))
        make_face()
        with Locations((31.85, 15.5)):
            Circle(SKETCH012_R, mode=Mode.SUBTRACT)
    extrude(amount=PAD006_DEPTH)

    # Sketch013 (on Face11 of Pocket) → Pad007 (join)
    with BuildSketch(Plane(origin=(0, 0, 14.6), x_dir=(1, 0, 0), z_dir=(0, 0, -1))):
        with BuildLine():
            Line((-35.7, 76.5), (-29.35, 76.5))
            Line((-29.35, 76.5), (-29.35, 72.5))
            ThreePointArc((-31.85, 70), (-30.082233, 70.732233), (-29.35, 72.5))
            Line((-35.7, 70), (-31.85, 70))
            Line((-35.7, 76.5), (-35.7, 70))
        make_face()
        with Locations((-31.85, 72.5)):
            Circle(SKETCH013_R, mode=Mode.SUBTRACT)
        with BuildLine():
            Line((35.7, 76.5), (35.7, 70))
            Line((35.7, 70), (31.85, 70))
            ThreePointArc((29.35, 72.5), (30.082233, 70.732233), (31.85, 70))
            Line((29.35, 76.5), (29.35, 72.5))
            Line((35.7, 76.5), (29.35, 76.5))
        make_face()
        with Locations((31.85, 72.5)):
            Circle(SKETCH013_R, mode=Mode.SUBTRACT)
    extrude(amount=PAD007_DEPTH)

    # Fillet
    fillet_edges = [part.edges().sort_by_distance(p)[0] for p in [
        (-35.7, 0, 14.6),
        (-35.7, -34, 14.6),
        (-35.7, -59.25, 14.6),
        (35.7, 0, 14.6),
        (35.7, -34, 14.6),
        (35.7, -59.25, 14.6),
    ]]
    fillet(fillet_edges, radius=FILLET_R)

    # Fillet001
    fillet001_edges = [part.edges().sort_by_distance(p)[0] for p in [
        (0, 19.5, 14.6),
        (0, -76.5, 14.6),
    ]]
    fillet(fillet001_edges, radius=FILLET001_R)

    # Fillet002
    fillet002_edges = [part.edges().sort_by_distance(p)[0] for p in [
        (-35.7, 19.5, 3),
        (35.7, 19.5, 3),
    ]]
    fillet(fillet002_edges, radius=FILLET002_R)

    # Fillet003
    fillet003_edges = [part.edges().sort_by_distance(p)[0] for p in [
        (-35.7, -76.5, 2.1),
        (35.7, -76.5, 2.1),
    ]]
    fillet(fillet003_edges, radius=FILLET003_R)

    # Fillet004
    fillet004_edges = [part.edges().sort_by_distance(p)[0] for p in [
        (0, 21.5, 16.6),
    ]]
    fillet(fillet004_edges, radius=FILLET004_R)

    # Fillet005
    fillet005_edges = [part.edges().sort_by_distance(p)[0] for p in [
        (37.7, -31.25, 16.6),
        (37.7, 21.5, 5.55),
        (-37.7, -31.25, 16.6),
        (-37.7, 21.5, 5.55),
    ]]
    fillet(fillet005_edges, radius=FILLET005_R)

    # Sketch022 (on Face36 of Pad007) → Pad013 (join)
    with BuildSketch(Plane(origin=(0, 0, 14.6), x_dir=(1, 0, 0), z_dir=(0, 0, -1))):
        with Locations((8.156075, -2.412758)):
            Rectangle(SKETCH022_W, SKETCH022_H)
        with Locations((8.156075, -2.412758)):
            Rectangle(SKETCH022_W_2, SKETCH022_H_2, mode=Mode.SUBTRACT)
    extrude(amount=PAD013_DEPTH)

    # Fillet011
    fillet011_edges = [part.edges().sort_by_distance(p)[0] for p in [
        (0, -78.5, 16.6),
        (37.7, -78.5, 6.3),
        (-37.7, -78.5, 6.3),
    ]]
    fillet(fillet011_edges, radius=FILLET011_R)


with BuildPart() as part_1:
    # Body placement: moved
    add(part.part.moved(Location((0, 0, -2))))


solid = part_1.part
